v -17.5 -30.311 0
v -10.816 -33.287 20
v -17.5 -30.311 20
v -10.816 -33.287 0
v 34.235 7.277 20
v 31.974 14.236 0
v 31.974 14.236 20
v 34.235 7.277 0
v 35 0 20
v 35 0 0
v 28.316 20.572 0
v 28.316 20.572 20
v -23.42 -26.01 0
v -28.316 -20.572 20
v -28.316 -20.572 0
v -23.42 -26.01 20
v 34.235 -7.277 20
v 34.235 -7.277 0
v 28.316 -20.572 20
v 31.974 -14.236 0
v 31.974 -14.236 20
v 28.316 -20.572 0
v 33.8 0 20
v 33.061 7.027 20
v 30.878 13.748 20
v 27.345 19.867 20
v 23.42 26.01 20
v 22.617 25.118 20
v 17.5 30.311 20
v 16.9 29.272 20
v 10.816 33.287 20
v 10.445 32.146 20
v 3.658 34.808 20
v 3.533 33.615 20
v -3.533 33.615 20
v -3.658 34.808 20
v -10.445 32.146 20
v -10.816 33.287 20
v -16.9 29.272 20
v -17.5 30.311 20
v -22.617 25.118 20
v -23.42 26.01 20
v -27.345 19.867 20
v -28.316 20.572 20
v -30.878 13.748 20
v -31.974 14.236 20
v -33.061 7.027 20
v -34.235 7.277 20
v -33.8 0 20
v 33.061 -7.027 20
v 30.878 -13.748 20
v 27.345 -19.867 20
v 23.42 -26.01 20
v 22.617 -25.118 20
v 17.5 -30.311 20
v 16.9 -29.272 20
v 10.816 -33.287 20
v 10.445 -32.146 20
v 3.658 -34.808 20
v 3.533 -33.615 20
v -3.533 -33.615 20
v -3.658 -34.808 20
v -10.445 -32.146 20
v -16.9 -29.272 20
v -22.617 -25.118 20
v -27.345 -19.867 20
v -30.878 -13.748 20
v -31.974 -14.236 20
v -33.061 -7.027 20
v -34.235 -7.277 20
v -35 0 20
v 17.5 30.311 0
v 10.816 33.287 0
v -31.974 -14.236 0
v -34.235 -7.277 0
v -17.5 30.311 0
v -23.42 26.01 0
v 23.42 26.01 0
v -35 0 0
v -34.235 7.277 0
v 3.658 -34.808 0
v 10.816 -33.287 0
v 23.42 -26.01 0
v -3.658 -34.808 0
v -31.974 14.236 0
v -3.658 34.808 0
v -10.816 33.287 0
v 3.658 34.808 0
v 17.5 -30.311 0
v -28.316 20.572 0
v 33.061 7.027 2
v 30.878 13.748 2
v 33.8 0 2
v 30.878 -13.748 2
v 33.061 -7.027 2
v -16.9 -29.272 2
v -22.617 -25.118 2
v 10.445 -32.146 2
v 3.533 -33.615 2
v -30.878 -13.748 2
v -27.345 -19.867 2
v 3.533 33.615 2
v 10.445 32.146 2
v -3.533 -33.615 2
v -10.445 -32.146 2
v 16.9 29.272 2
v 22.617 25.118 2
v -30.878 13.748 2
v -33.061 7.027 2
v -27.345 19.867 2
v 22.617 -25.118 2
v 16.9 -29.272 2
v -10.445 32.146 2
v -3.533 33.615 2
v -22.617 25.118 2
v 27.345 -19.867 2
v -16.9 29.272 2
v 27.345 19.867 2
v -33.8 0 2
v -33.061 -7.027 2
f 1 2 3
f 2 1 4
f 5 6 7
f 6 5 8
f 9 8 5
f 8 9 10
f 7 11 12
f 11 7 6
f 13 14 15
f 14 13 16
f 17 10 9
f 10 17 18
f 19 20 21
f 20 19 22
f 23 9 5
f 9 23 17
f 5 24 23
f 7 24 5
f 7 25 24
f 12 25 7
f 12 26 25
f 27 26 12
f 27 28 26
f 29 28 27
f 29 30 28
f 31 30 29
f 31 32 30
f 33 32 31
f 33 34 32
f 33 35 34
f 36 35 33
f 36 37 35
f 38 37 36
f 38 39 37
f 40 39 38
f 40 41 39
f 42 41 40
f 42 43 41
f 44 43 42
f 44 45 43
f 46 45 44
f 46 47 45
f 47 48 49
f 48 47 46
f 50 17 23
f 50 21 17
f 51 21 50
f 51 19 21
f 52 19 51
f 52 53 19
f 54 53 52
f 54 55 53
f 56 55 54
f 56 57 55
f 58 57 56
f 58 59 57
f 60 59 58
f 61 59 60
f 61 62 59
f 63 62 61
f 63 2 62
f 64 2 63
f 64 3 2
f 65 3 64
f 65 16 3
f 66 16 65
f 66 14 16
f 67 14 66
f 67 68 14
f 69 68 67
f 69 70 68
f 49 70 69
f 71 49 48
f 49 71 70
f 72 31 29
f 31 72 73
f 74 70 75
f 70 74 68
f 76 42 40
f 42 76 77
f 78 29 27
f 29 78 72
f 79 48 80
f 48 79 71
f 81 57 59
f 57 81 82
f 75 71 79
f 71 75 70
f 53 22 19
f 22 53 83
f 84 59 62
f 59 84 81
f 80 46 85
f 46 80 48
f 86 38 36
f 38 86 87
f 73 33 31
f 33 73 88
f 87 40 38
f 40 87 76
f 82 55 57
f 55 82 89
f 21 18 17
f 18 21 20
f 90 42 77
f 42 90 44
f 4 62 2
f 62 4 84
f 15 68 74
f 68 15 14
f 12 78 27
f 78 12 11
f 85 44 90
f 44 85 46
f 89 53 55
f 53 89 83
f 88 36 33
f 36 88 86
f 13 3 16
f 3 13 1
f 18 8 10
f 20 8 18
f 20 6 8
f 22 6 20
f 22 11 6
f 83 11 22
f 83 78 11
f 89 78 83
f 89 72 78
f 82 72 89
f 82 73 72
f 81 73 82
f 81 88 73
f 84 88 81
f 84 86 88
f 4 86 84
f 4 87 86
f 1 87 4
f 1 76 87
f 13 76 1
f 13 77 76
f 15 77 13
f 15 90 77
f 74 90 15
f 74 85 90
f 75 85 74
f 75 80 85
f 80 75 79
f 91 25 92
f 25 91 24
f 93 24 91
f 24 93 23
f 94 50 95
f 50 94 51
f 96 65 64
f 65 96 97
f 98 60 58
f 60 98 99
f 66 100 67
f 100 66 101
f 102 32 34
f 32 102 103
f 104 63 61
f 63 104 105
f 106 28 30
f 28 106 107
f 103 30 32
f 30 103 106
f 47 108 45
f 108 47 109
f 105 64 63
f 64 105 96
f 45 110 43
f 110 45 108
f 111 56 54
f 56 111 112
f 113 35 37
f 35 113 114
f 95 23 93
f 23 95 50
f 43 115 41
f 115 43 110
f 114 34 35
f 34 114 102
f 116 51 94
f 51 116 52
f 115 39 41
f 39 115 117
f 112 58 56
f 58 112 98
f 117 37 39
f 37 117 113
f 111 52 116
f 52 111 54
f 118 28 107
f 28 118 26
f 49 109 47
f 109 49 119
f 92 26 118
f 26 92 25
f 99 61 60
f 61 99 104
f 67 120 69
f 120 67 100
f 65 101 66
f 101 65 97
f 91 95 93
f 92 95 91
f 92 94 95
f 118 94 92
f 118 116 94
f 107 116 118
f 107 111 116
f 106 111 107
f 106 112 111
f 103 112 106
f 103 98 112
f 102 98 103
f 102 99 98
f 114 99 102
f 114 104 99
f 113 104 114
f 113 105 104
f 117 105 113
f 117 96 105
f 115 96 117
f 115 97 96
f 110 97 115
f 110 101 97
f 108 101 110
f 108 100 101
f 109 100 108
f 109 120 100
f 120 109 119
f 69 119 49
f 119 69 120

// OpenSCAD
difference(){
cylinder(d=70,h=20);
translate([0,0,2])
cylinder(d=70-0.6*4,h=20);
}
